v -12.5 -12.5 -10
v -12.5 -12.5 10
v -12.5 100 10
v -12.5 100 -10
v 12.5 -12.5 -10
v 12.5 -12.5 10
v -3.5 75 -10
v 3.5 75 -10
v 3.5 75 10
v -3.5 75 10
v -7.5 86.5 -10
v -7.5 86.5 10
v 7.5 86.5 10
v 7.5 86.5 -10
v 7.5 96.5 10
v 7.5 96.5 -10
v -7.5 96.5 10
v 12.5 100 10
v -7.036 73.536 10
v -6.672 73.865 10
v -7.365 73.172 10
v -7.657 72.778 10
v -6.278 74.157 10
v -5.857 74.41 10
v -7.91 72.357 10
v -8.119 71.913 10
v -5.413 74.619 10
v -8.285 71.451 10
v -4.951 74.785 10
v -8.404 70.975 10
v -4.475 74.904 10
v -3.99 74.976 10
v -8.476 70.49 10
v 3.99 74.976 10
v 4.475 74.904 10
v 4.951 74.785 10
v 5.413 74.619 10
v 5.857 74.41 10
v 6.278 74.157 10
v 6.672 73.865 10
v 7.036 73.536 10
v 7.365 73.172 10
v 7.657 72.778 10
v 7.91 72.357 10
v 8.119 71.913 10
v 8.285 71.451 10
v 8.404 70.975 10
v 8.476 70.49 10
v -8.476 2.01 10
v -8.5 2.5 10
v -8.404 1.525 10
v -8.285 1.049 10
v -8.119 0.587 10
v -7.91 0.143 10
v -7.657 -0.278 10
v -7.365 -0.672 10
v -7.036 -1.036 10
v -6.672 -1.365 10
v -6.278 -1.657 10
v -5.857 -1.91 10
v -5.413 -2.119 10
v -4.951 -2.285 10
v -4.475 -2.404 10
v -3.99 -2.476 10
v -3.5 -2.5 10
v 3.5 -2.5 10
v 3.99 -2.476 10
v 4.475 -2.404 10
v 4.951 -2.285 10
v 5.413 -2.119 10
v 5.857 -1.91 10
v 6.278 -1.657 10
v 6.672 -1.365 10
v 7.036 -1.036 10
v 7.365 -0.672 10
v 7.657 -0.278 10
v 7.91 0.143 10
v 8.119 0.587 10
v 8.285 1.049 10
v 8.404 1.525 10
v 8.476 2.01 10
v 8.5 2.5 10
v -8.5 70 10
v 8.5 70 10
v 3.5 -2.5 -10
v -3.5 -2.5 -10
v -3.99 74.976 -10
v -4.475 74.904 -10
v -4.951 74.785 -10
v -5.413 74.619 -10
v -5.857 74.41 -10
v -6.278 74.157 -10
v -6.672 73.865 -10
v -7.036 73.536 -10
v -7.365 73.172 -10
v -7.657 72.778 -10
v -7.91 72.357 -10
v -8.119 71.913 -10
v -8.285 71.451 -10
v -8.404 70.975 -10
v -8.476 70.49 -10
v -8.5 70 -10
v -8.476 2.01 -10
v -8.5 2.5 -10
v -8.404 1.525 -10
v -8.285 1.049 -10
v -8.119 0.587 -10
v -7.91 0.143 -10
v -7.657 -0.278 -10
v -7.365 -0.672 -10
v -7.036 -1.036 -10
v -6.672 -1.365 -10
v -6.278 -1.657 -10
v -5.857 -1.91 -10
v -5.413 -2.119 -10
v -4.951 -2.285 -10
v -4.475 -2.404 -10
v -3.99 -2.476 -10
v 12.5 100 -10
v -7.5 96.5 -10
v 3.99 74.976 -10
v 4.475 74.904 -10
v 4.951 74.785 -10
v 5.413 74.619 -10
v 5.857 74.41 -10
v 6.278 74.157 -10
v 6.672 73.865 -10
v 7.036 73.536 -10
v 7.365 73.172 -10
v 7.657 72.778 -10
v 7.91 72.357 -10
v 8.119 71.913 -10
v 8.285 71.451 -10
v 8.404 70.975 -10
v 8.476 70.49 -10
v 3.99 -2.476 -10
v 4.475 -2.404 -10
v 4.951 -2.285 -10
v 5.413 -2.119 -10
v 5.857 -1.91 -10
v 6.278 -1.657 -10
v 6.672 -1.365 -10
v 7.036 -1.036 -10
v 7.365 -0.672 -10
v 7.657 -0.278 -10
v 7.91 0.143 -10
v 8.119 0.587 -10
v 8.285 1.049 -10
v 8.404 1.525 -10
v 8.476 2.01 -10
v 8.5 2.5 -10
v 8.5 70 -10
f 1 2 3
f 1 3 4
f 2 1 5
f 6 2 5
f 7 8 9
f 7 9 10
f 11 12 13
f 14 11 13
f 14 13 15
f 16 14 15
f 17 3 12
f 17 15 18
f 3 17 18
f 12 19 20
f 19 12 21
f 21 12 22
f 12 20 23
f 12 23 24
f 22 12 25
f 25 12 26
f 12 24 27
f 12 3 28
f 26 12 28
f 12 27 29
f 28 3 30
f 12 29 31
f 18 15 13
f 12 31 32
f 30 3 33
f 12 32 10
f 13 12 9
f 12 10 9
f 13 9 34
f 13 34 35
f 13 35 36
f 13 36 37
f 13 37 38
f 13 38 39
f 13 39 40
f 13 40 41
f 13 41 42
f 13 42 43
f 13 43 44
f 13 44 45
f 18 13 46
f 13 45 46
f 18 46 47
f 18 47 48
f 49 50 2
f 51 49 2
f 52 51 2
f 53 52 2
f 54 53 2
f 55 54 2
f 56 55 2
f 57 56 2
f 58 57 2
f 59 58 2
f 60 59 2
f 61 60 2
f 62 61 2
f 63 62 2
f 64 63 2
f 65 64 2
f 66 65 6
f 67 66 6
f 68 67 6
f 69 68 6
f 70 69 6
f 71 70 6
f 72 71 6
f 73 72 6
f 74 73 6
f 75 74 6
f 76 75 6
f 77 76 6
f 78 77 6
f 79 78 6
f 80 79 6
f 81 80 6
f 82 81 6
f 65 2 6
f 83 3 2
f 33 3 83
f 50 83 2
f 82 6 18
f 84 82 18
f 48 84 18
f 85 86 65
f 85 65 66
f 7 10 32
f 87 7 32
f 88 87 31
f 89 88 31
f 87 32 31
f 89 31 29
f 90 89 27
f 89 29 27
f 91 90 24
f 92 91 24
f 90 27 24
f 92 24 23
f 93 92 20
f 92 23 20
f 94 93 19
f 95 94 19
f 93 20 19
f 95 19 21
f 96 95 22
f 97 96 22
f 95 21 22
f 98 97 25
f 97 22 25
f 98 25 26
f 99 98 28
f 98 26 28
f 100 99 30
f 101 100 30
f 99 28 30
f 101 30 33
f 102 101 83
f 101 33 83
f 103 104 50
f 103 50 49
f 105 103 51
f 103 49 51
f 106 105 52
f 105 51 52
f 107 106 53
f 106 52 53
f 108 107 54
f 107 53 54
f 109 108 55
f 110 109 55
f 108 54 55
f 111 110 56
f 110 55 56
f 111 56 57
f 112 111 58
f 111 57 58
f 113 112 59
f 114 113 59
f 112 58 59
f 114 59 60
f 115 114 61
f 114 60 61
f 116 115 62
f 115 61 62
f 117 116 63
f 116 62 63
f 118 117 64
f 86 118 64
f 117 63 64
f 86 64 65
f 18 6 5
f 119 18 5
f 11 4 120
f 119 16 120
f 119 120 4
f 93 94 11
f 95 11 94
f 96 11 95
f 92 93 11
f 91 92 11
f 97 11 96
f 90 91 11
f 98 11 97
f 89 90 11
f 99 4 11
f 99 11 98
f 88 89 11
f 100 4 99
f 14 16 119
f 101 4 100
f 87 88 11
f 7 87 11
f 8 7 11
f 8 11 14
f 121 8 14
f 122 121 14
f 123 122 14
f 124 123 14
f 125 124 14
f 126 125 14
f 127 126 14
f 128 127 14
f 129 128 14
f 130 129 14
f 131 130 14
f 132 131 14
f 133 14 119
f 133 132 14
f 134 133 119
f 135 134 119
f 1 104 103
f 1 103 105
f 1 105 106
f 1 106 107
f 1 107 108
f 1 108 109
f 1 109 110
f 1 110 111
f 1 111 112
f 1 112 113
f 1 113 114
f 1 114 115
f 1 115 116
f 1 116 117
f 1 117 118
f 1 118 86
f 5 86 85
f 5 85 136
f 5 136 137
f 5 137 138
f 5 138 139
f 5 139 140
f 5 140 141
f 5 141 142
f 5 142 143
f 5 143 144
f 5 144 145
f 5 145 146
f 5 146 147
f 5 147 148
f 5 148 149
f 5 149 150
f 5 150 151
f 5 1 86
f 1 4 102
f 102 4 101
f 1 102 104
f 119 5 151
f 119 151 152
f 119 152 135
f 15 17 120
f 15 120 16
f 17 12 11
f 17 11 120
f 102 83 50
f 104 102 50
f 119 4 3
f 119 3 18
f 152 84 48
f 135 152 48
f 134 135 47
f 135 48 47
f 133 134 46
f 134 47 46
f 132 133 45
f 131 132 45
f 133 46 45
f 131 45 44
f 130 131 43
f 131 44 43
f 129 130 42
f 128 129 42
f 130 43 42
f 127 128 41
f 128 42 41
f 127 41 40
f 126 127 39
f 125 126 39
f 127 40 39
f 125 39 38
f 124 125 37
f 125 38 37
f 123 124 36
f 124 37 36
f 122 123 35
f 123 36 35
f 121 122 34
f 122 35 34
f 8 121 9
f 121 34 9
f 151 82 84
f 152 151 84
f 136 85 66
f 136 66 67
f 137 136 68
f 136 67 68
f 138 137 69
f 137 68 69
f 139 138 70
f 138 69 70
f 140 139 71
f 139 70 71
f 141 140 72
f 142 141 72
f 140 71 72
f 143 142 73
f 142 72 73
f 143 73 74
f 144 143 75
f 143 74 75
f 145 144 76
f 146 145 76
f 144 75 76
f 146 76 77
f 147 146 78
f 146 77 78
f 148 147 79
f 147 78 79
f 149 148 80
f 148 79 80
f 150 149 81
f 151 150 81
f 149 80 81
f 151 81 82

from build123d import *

# Parameters (mm, degrees)
BOSS_EXTRUDE1_DEPTH      = 100
BOSS_EXTRUDE1_DEPTH_BACK = 12.5
SKETCH1_W                = 25
SKETCH1_H                = 20
SKETCH2_W                = 15
SKETCH2_H                = 10
CUT_EXTRUDE1_DEPTH       = 103.74361294
CUT_EXTRUDE2_DEPTH       = 103.74361294


with BuildPart() as part:
    # Sketch1 → Boss-Extrude1 (new, two sides: drawn at the far end of the back side and taken through both)
    with BuildSketch(Plane(origin=(0, 0, 0), x_dir=(1, 0, 0), z_dir=(0, 1, 0)).offset(-BOSS_EXTRUDE1_DEPTH_BACK)):
        Rectangle(SKETCH1_W, SKETCH1_H)
    extrude(amount=BOSS_EXTRUDE1_DEPTH + BOSS_EXTRUDE1_DEPTH_BACK)

    # Sketch2 → Cut-Extrude1 (cut, through all)
    with BuildSketch(Plane.XY.offset(10)):
        with Locations((0, 91.5)):
            Rectangle(SKETCH2_W, SKETCH2_H)
    extrude(amount=-CUT_EXTRUDE1_DEPTH, mode=Mode.SUBTRACT)

    # Sketch3 → Cut-Extrude2 (cut, through all)
    with BuildSketch(Plane.XY.offset(10)):
        with BuildLine():
            Line((-3.5, -2.5), (3.5, -2.5))
            ThreePointArc((3.5, -2.5), (7.035533906, -1.035533906), (8.5, 2.5))
            Line((8.5, 2.5), (8.5, 70))
            ThreePointArc((8.5, 70), (7.035533906, 73.535533906), (3.5, 75))
            Line((3.5, 75), (-3.5, 75))
            ThreePointArc((-3.5, 75), (-7.035533906, 73.535533906), (-8.5, 70))
            Line((-8.5, 70), (-8.5, 2.5))
            ThreePointArc((-8.5, 2.5), (-7.035533906, -1.035533906), (-3.5, -2.5))
        make_face()
    extrude(amount=-CUT_EXTRUDE2_DEPTH, mode=Mode.SUBTRACT)


solid = part.part
